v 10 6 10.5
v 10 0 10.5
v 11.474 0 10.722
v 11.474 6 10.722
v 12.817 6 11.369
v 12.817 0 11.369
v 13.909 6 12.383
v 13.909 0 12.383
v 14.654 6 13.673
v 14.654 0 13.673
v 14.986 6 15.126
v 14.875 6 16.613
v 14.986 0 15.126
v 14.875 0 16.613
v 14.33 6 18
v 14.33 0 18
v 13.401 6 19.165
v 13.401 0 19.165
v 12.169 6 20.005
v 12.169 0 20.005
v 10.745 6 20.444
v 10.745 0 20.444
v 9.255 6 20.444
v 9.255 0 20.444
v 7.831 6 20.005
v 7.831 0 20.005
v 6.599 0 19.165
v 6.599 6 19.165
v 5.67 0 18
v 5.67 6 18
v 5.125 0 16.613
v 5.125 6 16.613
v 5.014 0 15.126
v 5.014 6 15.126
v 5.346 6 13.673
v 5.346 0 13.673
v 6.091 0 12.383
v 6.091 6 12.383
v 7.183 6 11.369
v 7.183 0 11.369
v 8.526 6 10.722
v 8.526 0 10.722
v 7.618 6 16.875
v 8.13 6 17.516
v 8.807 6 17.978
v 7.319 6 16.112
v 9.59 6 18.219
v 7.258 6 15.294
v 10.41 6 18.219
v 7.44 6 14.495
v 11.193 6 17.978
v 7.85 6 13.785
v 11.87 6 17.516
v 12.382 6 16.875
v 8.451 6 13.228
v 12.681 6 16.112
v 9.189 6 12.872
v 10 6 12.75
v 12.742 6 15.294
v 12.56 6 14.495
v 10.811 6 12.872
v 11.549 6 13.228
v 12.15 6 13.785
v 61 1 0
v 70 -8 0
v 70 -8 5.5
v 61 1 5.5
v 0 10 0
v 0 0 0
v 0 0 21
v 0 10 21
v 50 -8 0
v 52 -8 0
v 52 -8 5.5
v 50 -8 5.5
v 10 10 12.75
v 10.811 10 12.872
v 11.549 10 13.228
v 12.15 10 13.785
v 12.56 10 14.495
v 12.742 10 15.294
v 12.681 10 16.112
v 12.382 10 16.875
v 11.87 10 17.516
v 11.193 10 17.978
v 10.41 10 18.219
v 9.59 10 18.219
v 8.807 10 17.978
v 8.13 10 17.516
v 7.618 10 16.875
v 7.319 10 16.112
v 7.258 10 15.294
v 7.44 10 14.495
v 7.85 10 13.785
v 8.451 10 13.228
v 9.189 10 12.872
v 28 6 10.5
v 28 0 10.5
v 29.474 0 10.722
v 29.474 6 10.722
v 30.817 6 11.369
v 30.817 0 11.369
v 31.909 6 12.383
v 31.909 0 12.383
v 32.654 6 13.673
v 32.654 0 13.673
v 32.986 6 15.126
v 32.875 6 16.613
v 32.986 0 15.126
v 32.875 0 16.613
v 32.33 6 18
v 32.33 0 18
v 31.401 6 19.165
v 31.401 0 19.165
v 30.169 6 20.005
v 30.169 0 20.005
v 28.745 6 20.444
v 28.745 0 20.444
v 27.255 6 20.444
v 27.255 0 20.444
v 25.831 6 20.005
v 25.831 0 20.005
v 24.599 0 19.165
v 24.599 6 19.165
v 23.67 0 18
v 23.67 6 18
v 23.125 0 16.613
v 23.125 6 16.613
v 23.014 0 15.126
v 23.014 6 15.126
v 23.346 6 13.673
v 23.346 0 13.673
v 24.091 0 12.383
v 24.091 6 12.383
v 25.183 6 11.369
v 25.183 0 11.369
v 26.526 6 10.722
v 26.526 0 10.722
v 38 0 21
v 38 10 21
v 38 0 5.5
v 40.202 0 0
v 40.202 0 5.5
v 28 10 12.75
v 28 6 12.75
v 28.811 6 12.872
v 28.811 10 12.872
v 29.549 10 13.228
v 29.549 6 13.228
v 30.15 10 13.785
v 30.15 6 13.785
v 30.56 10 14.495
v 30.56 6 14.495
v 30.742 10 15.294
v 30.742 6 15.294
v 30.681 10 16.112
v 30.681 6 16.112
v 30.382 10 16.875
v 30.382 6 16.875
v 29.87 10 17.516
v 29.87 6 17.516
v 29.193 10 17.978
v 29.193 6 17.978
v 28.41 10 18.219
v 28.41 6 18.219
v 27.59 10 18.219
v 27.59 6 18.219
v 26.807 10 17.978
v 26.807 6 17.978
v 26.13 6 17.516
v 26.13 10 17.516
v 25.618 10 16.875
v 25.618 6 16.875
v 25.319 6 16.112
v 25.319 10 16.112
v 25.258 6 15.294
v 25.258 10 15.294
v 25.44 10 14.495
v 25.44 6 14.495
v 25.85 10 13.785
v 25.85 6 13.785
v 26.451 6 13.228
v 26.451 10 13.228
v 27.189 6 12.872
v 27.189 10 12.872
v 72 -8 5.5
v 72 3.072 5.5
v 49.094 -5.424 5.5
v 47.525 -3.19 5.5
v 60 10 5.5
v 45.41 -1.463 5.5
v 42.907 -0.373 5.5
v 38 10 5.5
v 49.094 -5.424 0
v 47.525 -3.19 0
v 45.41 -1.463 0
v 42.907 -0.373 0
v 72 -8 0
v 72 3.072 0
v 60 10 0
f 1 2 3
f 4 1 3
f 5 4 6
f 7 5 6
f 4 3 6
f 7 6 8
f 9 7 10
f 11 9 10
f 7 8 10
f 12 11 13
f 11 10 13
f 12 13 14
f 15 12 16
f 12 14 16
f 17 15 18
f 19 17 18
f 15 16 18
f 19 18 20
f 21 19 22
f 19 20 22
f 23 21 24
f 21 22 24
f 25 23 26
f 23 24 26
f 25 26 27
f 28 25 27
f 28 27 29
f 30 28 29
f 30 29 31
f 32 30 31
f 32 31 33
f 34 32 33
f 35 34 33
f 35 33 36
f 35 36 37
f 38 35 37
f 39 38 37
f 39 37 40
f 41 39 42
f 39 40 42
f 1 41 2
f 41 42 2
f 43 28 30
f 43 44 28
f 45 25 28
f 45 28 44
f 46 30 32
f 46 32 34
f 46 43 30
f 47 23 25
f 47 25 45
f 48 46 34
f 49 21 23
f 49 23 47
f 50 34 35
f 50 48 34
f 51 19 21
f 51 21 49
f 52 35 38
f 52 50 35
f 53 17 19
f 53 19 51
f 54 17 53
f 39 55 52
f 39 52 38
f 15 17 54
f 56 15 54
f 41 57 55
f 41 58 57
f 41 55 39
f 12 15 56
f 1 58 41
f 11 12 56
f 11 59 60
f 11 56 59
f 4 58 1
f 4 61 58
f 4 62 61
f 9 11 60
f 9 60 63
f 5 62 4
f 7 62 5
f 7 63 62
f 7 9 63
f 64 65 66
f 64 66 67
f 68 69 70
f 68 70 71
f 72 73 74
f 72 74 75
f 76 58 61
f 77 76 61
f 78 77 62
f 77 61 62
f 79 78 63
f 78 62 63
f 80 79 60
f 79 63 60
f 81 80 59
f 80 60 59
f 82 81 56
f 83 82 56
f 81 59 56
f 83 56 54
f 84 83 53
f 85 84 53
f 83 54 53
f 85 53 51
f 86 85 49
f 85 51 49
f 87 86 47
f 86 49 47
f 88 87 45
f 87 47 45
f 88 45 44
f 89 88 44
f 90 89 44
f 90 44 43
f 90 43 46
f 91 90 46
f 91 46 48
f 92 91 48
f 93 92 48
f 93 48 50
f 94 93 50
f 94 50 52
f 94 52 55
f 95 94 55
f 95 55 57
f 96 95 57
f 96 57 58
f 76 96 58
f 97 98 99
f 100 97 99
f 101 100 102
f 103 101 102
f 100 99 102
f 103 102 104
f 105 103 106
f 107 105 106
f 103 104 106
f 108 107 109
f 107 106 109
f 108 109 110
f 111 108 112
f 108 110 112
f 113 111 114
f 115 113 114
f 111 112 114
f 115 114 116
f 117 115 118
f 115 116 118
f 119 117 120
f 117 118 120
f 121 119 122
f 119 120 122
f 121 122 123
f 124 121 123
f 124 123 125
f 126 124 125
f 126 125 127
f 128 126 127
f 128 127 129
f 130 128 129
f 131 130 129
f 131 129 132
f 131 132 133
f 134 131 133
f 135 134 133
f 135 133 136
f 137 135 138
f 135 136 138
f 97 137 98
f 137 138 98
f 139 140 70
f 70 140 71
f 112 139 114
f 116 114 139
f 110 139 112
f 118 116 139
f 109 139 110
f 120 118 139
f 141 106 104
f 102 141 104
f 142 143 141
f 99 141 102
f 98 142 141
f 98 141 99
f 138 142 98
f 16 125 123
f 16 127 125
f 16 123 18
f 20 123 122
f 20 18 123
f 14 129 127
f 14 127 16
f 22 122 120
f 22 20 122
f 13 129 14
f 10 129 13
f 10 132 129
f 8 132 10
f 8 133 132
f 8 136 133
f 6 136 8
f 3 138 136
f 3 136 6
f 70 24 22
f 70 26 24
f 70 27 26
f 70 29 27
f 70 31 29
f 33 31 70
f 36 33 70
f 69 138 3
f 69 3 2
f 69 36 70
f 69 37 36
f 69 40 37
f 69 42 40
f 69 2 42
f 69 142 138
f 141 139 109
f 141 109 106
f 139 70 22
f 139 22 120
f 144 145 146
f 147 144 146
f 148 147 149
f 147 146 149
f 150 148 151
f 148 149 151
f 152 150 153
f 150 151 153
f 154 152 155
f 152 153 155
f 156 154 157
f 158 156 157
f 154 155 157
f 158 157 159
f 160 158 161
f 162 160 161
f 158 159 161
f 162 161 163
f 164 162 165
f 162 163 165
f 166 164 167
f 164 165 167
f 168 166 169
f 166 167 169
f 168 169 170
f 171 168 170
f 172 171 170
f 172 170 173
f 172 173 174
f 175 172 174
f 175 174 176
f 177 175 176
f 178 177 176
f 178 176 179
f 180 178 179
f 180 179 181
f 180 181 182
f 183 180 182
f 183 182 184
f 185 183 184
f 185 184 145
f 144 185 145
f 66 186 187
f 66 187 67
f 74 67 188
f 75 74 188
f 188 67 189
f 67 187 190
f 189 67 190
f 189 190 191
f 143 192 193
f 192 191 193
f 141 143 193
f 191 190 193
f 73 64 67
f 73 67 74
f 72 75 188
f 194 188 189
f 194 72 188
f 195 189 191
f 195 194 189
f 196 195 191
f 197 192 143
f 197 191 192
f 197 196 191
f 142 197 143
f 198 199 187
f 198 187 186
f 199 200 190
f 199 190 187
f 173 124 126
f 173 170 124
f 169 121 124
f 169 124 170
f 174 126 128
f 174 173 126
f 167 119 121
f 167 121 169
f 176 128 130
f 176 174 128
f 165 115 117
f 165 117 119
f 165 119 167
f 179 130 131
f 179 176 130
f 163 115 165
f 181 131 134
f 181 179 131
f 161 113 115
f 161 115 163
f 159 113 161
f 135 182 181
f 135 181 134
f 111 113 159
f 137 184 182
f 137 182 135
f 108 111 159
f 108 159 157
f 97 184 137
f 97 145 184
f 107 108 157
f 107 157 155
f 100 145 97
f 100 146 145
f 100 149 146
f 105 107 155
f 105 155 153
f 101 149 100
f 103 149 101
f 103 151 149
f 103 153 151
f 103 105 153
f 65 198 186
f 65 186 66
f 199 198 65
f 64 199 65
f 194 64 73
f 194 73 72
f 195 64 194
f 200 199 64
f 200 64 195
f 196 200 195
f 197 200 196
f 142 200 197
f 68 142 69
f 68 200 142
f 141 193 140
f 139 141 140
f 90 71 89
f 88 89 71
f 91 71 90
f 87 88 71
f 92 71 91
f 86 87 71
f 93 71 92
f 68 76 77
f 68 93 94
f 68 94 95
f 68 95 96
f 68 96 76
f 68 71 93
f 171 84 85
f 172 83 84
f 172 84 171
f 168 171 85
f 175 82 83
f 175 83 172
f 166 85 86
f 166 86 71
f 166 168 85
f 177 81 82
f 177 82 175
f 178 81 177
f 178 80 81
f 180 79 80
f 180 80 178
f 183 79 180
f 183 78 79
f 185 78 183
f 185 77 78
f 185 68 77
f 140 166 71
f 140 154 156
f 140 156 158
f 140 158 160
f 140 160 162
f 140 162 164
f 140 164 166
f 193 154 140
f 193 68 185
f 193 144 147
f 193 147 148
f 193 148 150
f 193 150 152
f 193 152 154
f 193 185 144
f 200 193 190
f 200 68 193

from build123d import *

# Parameters (mm, degrees)
BASE_EXTRUSION_DEPTH    = 21
ESQUISSE2_W             = 56.002380091
ESQUISSE2_H             = 20.539256902
ENL_V_MAT_EXTRU_1_DEPTH = 78.129760793
ESQUISSE3_R             = 5
ENL_V_MAT_EXTRU_2_DEPTH = 6
ESQUISSE4_R             = 2.75
ENL_V_MAT_EXTRU_3_DEPTH = 6


with BuildPart() as part:
    # Esquisse1 → Base-Extrusion (new body)
    with BuildSketch(Plane.XY):
        with BuildLine():
            Line((0, 0), (0, 10))
            Line((0, 10), (60, 10))
            Line((60, 10), (72, 3.07179677))
            Line((72, 3.07179677), (72, -8))
            Line((72, -8), (70, -8))
            Line((70, -8), (61, 1))
            Line((61, 1), (52, -8))
            Line((52, -8), (50, -8))
            ThreePointArc((50, -8), (46.526596349, -2.254033308), (40.202041029, 0))
            Line((40.202041029, 0), (0, 0))
        make_face()
    extrude(amount=BASE_EXTRUSION_DEPTH)

    # Esquisse2 → Enlèv. mat.-Extru.1 (cut, through all)
    with BuildSketch(Plane(origin=(0, 10, 0), x_dir=(-1, 0, 0), z_dir=(0, 1, 0))):
        with Locations((-66.001190046, 15.769628451)):
            Rectangle(ESQUISSE2_W, ESQUISSE2_H)
    extrude(amount=-ENL_V_MAT_EXTRU_1_DEPTH, mode=Mode.SUBTRACT)

    # Esquisse3 → Enlèv. mat.-Extru.2 (cut)
    with BuildSketch(Plane.XZ):
        with Locations(Location((28, 15.5, 0), (0, 0, 270))):
            Circle(ESQUISSE3_R)
        with Locations(Location((10, 15.5, 0), (0, 0, 270))):
            Circle(ESQUISSE3_R)
    extrude(amount=-ENL_V_MAT_EXTRU_2_DEPTH, mode=Mode.SUBTRACT)

    # Esquisse4 → Enlèv. mat.-Extru.3 (cut)
    with BuildSketch(Plane.XZ.offset(-6)):
        with Locations(Location((28, 15.5, 0), (0, 0, 270))):
            Circle(ESQUISSE4_R)
        with Locations(Location((10, 15.5, 0), (0, 0, 270))):
            Circle(ESQUISSE4_R)
    extrude(amount=-ENL_V_MAT_EXTRU_3_DEPTH, mode=Mode.SUBTRACT)


solid = part.part
